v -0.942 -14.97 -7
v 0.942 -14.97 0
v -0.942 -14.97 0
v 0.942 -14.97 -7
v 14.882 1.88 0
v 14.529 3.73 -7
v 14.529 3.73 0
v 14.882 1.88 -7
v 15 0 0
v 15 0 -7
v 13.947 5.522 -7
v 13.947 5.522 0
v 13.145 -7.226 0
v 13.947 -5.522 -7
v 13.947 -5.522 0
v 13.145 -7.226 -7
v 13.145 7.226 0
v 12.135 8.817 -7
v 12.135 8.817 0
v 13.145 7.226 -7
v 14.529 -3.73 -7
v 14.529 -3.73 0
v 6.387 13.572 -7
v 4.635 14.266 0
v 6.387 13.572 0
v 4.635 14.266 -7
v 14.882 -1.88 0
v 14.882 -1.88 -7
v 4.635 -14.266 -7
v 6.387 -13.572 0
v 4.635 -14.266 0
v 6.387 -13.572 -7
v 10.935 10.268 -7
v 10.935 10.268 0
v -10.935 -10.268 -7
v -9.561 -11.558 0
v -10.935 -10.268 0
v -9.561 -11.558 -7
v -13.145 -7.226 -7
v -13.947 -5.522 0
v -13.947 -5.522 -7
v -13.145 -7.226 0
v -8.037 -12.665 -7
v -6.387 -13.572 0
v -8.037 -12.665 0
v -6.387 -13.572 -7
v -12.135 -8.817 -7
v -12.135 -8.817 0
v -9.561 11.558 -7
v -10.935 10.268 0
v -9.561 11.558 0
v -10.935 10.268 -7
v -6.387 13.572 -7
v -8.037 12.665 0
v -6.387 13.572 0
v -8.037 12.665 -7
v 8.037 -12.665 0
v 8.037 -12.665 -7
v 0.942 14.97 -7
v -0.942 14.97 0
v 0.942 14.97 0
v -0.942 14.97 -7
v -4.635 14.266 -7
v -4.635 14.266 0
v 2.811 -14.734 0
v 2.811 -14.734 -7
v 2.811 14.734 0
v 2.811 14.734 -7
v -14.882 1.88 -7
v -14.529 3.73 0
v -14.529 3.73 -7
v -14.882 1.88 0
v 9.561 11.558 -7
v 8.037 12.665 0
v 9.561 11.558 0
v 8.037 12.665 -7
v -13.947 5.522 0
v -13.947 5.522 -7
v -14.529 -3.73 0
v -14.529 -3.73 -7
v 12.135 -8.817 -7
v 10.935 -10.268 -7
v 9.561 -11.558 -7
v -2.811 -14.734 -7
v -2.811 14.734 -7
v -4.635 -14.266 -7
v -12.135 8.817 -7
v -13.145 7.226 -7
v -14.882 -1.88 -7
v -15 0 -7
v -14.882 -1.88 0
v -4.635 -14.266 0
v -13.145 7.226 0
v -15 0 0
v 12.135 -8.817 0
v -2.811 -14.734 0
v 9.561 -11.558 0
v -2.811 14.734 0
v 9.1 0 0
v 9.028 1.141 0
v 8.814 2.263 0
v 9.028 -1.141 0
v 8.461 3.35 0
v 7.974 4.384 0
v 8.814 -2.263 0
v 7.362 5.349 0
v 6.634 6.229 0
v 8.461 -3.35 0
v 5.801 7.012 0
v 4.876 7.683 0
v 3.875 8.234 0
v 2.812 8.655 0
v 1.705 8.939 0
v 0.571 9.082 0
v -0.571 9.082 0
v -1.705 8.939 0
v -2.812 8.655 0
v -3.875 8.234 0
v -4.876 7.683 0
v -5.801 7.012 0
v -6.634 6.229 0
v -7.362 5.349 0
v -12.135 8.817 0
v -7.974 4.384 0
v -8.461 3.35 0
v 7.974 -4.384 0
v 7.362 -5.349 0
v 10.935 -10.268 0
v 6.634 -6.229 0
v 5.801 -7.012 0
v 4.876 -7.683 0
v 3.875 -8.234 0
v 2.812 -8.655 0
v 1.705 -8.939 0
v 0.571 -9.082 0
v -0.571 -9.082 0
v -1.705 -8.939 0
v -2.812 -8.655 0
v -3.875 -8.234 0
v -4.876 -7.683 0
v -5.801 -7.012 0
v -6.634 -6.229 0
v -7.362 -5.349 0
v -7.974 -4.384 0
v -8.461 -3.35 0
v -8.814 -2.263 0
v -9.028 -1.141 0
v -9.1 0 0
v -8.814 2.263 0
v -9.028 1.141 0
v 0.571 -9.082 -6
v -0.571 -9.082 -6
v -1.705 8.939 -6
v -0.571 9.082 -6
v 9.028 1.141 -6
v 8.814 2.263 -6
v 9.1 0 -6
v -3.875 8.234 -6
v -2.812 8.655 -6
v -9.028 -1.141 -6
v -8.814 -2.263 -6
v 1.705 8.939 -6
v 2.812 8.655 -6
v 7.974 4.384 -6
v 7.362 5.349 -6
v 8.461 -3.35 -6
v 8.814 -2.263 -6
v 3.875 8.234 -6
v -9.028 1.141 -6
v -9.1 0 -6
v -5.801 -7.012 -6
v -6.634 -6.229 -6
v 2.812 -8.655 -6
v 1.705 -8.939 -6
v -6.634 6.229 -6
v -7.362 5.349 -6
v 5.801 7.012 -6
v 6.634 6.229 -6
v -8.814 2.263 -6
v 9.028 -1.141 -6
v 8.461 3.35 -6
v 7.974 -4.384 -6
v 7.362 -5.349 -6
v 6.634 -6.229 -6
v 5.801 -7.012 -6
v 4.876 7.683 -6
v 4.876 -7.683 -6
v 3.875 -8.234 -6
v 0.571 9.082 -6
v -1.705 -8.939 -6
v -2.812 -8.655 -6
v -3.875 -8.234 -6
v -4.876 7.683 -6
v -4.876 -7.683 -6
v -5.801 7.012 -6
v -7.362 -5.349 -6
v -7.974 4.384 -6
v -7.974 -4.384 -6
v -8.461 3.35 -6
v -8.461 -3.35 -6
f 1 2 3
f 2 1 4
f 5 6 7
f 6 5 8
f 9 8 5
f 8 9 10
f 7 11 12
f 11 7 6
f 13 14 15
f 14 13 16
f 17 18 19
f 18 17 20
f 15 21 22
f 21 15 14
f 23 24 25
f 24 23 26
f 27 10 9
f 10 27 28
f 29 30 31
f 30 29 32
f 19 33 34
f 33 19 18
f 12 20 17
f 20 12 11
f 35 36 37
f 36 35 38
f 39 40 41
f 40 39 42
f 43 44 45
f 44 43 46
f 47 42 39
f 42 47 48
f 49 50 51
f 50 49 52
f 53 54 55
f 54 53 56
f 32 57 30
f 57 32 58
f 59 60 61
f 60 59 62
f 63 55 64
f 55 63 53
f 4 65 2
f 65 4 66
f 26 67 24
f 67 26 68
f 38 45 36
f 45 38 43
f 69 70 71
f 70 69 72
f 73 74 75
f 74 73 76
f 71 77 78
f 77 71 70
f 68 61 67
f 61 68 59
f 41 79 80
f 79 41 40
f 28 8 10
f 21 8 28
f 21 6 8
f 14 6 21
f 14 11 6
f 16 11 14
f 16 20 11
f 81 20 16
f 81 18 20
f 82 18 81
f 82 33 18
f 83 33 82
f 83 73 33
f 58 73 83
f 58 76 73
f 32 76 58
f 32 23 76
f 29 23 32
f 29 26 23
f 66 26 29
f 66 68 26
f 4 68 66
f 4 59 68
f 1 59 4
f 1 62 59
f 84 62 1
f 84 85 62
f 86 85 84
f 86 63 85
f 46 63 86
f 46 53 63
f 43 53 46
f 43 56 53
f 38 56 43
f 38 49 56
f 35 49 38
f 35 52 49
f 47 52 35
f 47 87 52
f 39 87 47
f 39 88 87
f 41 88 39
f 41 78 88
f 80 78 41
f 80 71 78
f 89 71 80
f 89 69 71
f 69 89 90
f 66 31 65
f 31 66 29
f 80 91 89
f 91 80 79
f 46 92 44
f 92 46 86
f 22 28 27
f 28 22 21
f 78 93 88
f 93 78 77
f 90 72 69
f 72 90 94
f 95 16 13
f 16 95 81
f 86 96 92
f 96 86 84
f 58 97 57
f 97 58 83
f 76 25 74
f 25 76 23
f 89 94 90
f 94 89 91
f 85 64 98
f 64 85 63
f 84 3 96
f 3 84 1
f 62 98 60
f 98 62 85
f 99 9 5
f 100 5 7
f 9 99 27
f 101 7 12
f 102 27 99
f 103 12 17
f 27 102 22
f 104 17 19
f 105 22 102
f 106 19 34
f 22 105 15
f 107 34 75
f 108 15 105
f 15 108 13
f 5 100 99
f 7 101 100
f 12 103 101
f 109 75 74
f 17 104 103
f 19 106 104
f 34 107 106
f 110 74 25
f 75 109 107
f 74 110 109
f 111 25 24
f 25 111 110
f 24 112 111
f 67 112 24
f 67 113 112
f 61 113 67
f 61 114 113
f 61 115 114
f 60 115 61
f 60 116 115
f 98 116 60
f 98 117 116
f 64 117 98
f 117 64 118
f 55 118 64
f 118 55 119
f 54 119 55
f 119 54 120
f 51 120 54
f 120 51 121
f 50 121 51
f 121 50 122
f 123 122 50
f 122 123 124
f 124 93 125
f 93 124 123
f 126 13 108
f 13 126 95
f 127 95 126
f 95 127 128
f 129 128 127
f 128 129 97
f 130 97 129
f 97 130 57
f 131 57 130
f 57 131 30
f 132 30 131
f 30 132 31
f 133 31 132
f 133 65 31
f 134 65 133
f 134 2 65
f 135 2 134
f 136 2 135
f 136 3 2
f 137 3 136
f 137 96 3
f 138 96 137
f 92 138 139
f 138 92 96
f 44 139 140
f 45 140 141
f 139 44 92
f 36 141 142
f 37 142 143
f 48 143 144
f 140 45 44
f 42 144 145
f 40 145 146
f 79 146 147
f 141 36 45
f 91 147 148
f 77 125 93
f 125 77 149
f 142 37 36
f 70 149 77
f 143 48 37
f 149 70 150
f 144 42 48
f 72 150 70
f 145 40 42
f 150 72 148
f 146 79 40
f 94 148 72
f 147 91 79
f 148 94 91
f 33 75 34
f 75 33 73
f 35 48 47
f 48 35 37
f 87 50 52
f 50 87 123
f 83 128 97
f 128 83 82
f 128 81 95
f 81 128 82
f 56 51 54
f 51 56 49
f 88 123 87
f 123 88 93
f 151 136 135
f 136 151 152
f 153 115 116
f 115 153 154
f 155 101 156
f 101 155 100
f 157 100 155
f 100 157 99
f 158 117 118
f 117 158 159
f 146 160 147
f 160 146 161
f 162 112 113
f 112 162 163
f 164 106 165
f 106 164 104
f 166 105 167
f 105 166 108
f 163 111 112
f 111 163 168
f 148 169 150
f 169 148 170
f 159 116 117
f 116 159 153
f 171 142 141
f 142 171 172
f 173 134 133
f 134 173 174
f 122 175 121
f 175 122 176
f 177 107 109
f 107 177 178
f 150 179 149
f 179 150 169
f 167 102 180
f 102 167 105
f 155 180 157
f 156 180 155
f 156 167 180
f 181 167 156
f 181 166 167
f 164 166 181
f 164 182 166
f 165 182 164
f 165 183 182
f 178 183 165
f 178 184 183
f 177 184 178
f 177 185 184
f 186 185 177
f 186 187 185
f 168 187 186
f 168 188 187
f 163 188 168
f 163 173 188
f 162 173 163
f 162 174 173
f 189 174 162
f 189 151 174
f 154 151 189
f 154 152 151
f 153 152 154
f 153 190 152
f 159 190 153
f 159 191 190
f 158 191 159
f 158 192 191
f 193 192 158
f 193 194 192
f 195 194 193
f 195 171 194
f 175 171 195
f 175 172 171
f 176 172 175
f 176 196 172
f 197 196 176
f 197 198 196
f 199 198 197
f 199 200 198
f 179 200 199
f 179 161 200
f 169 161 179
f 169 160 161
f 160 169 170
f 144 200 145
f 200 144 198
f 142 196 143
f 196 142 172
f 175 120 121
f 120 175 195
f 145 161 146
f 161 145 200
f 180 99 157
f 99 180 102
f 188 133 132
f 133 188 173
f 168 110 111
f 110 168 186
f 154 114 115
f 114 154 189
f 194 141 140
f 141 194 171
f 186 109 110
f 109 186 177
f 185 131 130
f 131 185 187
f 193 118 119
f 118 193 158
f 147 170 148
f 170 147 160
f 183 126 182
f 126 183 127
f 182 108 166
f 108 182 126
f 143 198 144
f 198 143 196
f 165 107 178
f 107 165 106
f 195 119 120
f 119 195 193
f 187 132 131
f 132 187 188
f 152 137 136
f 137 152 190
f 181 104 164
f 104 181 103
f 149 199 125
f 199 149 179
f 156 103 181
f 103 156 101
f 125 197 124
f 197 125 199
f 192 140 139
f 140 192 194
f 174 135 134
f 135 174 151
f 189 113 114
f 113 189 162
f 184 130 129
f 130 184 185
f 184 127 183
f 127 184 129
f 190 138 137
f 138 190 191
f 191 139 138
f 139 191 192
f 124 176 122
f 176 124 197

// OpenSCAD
$fn = 50;


difference() {
	union() {
		translate(v = [0, 0, -7.0000000000]) {
			cylinder(h = 7, r = 15.0000000000);
		}
	}
	union() {
		#translate(v = [0, 0, -6.0000000000]) {
			cylinder(h = 6, r = 9.1000000000);
		}
	}
}
